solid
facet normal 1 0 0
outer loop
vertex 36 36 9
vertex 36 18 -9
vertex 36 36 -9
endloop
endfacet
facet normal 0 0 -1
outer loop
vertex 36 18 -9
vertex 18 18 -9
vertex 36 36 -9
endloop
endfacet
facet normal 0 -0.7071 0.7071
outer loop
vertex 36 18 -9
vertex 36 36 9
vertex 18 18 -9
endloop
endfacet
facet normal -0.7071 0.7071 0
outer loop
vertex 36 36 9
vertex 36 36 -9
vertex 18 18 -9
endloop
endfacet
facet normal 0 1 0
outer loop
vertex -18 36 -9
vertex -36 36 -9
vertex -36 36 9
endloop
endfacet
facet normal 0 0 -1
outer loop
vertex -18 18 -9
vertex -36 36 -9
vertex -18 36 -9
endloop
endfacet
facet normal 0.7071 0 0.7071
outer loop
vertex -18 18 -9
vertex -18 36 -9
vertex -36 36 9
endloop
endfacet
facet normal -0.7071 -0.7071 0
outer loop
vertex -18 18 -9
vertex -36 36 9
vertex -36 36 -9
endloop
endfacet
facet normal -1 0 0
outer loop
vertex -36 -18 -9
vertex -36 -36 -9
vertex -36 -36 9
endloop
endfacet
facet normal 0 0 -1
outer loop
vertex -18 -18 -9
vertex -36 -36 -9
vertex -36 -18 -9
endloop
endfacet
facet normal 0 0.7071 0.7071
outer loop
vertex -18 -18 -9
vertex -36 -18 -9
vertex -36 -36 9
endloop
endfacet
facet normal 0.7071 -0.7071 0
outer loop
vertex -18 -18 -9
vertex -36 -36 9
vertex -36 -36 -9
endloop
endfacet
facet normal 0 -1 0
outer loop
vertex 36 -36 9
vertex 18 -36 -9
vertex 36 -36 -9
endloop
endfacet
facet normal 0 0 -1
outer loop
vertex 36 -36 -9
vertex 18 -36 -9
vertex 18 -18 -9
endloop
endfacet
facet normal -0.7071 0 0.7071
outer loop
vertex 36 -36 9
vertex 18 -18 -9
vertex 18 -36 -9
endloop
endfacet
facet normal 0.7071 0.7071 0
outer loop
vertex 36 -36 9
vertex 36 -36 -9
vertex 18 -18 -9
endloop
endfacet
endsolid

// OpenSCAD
// file: def.scad
total_size = 72;
block_size_2 = total_size / 2 - 0.1;
block_size_4 = total_size / 4;
block_size_6 = total_size / 6;

inf = 1000;

round_radius = 1;
sticker_margin = 2.5;
sticker_round_radius = 0.75;

module _block(size) {
    minkowski() {
        cube([size - round_radius * 2, size - round_radius * 2, size - round_radius * 2], center = true);
        sphere(r = round_radius, $fn = 24);
    }
}

module _selector_0(size) {
    cube([size - 0.2, size - 0.2, size - 0.2], center = true);
}

module _sticker(size) {
    minkowski() {
        cube([size - sticker_margin * 2, size - sticker_margin * 2, 0.1], center = true);
        cylinder(r = sticker_round_radius, h = 0.1, $fn = 24);
    }
}

module _selector_corner_cw(size) {
    difference() {
        cube([size, size, size], center = true);
        rotate([0, -45, 0])
            translate([-inf, -inf, 0])
                cube([inf * 2, inf * 2, inf]);
        rotate([90, 0, 45])
            translate([-inf, -inf, 0])
                cube([inf * 2, inf * 2, inf]);
    }
}

module _selector_corner_ccw(size) {
    difference() {
        cube([size, size, size], center = true);
        rotate([45, 0, 0])
            translate([-inf, -inf, 0])
                cube([inf * 2, inf * 2, inf]);
        rotate([0, -90, -45])
            translate([-inf, -inf, 0])
                cube([inf * 2, inf * 2, inf]);
    }
}

module _selector_edge_cw(size) {
    difference() {
        cube([size, size, size], center = true);
        rotate([90, 0, 45])
            translate([-inf, -inf, 0])
                cube([inf * 2, inf * 2, inf]);
    }
}

module _selector_edge_ccw(size) {
    difference() {
        cube([size, size, size], center = true);
        rotate([0, -90, -45])
            translate([-inf, -inf, 0])
                cube([inf * 2, inf * 2, inf]);
    }
}
// main file
include <def.scad>

for (deg = [0 : 90 : 270])
    rotate([0, 0, deg])
        translate([block_size_4 * 1.5, block_size_4 * 1.5, 0])
            _selector_corner_ccw(block_size_4);
